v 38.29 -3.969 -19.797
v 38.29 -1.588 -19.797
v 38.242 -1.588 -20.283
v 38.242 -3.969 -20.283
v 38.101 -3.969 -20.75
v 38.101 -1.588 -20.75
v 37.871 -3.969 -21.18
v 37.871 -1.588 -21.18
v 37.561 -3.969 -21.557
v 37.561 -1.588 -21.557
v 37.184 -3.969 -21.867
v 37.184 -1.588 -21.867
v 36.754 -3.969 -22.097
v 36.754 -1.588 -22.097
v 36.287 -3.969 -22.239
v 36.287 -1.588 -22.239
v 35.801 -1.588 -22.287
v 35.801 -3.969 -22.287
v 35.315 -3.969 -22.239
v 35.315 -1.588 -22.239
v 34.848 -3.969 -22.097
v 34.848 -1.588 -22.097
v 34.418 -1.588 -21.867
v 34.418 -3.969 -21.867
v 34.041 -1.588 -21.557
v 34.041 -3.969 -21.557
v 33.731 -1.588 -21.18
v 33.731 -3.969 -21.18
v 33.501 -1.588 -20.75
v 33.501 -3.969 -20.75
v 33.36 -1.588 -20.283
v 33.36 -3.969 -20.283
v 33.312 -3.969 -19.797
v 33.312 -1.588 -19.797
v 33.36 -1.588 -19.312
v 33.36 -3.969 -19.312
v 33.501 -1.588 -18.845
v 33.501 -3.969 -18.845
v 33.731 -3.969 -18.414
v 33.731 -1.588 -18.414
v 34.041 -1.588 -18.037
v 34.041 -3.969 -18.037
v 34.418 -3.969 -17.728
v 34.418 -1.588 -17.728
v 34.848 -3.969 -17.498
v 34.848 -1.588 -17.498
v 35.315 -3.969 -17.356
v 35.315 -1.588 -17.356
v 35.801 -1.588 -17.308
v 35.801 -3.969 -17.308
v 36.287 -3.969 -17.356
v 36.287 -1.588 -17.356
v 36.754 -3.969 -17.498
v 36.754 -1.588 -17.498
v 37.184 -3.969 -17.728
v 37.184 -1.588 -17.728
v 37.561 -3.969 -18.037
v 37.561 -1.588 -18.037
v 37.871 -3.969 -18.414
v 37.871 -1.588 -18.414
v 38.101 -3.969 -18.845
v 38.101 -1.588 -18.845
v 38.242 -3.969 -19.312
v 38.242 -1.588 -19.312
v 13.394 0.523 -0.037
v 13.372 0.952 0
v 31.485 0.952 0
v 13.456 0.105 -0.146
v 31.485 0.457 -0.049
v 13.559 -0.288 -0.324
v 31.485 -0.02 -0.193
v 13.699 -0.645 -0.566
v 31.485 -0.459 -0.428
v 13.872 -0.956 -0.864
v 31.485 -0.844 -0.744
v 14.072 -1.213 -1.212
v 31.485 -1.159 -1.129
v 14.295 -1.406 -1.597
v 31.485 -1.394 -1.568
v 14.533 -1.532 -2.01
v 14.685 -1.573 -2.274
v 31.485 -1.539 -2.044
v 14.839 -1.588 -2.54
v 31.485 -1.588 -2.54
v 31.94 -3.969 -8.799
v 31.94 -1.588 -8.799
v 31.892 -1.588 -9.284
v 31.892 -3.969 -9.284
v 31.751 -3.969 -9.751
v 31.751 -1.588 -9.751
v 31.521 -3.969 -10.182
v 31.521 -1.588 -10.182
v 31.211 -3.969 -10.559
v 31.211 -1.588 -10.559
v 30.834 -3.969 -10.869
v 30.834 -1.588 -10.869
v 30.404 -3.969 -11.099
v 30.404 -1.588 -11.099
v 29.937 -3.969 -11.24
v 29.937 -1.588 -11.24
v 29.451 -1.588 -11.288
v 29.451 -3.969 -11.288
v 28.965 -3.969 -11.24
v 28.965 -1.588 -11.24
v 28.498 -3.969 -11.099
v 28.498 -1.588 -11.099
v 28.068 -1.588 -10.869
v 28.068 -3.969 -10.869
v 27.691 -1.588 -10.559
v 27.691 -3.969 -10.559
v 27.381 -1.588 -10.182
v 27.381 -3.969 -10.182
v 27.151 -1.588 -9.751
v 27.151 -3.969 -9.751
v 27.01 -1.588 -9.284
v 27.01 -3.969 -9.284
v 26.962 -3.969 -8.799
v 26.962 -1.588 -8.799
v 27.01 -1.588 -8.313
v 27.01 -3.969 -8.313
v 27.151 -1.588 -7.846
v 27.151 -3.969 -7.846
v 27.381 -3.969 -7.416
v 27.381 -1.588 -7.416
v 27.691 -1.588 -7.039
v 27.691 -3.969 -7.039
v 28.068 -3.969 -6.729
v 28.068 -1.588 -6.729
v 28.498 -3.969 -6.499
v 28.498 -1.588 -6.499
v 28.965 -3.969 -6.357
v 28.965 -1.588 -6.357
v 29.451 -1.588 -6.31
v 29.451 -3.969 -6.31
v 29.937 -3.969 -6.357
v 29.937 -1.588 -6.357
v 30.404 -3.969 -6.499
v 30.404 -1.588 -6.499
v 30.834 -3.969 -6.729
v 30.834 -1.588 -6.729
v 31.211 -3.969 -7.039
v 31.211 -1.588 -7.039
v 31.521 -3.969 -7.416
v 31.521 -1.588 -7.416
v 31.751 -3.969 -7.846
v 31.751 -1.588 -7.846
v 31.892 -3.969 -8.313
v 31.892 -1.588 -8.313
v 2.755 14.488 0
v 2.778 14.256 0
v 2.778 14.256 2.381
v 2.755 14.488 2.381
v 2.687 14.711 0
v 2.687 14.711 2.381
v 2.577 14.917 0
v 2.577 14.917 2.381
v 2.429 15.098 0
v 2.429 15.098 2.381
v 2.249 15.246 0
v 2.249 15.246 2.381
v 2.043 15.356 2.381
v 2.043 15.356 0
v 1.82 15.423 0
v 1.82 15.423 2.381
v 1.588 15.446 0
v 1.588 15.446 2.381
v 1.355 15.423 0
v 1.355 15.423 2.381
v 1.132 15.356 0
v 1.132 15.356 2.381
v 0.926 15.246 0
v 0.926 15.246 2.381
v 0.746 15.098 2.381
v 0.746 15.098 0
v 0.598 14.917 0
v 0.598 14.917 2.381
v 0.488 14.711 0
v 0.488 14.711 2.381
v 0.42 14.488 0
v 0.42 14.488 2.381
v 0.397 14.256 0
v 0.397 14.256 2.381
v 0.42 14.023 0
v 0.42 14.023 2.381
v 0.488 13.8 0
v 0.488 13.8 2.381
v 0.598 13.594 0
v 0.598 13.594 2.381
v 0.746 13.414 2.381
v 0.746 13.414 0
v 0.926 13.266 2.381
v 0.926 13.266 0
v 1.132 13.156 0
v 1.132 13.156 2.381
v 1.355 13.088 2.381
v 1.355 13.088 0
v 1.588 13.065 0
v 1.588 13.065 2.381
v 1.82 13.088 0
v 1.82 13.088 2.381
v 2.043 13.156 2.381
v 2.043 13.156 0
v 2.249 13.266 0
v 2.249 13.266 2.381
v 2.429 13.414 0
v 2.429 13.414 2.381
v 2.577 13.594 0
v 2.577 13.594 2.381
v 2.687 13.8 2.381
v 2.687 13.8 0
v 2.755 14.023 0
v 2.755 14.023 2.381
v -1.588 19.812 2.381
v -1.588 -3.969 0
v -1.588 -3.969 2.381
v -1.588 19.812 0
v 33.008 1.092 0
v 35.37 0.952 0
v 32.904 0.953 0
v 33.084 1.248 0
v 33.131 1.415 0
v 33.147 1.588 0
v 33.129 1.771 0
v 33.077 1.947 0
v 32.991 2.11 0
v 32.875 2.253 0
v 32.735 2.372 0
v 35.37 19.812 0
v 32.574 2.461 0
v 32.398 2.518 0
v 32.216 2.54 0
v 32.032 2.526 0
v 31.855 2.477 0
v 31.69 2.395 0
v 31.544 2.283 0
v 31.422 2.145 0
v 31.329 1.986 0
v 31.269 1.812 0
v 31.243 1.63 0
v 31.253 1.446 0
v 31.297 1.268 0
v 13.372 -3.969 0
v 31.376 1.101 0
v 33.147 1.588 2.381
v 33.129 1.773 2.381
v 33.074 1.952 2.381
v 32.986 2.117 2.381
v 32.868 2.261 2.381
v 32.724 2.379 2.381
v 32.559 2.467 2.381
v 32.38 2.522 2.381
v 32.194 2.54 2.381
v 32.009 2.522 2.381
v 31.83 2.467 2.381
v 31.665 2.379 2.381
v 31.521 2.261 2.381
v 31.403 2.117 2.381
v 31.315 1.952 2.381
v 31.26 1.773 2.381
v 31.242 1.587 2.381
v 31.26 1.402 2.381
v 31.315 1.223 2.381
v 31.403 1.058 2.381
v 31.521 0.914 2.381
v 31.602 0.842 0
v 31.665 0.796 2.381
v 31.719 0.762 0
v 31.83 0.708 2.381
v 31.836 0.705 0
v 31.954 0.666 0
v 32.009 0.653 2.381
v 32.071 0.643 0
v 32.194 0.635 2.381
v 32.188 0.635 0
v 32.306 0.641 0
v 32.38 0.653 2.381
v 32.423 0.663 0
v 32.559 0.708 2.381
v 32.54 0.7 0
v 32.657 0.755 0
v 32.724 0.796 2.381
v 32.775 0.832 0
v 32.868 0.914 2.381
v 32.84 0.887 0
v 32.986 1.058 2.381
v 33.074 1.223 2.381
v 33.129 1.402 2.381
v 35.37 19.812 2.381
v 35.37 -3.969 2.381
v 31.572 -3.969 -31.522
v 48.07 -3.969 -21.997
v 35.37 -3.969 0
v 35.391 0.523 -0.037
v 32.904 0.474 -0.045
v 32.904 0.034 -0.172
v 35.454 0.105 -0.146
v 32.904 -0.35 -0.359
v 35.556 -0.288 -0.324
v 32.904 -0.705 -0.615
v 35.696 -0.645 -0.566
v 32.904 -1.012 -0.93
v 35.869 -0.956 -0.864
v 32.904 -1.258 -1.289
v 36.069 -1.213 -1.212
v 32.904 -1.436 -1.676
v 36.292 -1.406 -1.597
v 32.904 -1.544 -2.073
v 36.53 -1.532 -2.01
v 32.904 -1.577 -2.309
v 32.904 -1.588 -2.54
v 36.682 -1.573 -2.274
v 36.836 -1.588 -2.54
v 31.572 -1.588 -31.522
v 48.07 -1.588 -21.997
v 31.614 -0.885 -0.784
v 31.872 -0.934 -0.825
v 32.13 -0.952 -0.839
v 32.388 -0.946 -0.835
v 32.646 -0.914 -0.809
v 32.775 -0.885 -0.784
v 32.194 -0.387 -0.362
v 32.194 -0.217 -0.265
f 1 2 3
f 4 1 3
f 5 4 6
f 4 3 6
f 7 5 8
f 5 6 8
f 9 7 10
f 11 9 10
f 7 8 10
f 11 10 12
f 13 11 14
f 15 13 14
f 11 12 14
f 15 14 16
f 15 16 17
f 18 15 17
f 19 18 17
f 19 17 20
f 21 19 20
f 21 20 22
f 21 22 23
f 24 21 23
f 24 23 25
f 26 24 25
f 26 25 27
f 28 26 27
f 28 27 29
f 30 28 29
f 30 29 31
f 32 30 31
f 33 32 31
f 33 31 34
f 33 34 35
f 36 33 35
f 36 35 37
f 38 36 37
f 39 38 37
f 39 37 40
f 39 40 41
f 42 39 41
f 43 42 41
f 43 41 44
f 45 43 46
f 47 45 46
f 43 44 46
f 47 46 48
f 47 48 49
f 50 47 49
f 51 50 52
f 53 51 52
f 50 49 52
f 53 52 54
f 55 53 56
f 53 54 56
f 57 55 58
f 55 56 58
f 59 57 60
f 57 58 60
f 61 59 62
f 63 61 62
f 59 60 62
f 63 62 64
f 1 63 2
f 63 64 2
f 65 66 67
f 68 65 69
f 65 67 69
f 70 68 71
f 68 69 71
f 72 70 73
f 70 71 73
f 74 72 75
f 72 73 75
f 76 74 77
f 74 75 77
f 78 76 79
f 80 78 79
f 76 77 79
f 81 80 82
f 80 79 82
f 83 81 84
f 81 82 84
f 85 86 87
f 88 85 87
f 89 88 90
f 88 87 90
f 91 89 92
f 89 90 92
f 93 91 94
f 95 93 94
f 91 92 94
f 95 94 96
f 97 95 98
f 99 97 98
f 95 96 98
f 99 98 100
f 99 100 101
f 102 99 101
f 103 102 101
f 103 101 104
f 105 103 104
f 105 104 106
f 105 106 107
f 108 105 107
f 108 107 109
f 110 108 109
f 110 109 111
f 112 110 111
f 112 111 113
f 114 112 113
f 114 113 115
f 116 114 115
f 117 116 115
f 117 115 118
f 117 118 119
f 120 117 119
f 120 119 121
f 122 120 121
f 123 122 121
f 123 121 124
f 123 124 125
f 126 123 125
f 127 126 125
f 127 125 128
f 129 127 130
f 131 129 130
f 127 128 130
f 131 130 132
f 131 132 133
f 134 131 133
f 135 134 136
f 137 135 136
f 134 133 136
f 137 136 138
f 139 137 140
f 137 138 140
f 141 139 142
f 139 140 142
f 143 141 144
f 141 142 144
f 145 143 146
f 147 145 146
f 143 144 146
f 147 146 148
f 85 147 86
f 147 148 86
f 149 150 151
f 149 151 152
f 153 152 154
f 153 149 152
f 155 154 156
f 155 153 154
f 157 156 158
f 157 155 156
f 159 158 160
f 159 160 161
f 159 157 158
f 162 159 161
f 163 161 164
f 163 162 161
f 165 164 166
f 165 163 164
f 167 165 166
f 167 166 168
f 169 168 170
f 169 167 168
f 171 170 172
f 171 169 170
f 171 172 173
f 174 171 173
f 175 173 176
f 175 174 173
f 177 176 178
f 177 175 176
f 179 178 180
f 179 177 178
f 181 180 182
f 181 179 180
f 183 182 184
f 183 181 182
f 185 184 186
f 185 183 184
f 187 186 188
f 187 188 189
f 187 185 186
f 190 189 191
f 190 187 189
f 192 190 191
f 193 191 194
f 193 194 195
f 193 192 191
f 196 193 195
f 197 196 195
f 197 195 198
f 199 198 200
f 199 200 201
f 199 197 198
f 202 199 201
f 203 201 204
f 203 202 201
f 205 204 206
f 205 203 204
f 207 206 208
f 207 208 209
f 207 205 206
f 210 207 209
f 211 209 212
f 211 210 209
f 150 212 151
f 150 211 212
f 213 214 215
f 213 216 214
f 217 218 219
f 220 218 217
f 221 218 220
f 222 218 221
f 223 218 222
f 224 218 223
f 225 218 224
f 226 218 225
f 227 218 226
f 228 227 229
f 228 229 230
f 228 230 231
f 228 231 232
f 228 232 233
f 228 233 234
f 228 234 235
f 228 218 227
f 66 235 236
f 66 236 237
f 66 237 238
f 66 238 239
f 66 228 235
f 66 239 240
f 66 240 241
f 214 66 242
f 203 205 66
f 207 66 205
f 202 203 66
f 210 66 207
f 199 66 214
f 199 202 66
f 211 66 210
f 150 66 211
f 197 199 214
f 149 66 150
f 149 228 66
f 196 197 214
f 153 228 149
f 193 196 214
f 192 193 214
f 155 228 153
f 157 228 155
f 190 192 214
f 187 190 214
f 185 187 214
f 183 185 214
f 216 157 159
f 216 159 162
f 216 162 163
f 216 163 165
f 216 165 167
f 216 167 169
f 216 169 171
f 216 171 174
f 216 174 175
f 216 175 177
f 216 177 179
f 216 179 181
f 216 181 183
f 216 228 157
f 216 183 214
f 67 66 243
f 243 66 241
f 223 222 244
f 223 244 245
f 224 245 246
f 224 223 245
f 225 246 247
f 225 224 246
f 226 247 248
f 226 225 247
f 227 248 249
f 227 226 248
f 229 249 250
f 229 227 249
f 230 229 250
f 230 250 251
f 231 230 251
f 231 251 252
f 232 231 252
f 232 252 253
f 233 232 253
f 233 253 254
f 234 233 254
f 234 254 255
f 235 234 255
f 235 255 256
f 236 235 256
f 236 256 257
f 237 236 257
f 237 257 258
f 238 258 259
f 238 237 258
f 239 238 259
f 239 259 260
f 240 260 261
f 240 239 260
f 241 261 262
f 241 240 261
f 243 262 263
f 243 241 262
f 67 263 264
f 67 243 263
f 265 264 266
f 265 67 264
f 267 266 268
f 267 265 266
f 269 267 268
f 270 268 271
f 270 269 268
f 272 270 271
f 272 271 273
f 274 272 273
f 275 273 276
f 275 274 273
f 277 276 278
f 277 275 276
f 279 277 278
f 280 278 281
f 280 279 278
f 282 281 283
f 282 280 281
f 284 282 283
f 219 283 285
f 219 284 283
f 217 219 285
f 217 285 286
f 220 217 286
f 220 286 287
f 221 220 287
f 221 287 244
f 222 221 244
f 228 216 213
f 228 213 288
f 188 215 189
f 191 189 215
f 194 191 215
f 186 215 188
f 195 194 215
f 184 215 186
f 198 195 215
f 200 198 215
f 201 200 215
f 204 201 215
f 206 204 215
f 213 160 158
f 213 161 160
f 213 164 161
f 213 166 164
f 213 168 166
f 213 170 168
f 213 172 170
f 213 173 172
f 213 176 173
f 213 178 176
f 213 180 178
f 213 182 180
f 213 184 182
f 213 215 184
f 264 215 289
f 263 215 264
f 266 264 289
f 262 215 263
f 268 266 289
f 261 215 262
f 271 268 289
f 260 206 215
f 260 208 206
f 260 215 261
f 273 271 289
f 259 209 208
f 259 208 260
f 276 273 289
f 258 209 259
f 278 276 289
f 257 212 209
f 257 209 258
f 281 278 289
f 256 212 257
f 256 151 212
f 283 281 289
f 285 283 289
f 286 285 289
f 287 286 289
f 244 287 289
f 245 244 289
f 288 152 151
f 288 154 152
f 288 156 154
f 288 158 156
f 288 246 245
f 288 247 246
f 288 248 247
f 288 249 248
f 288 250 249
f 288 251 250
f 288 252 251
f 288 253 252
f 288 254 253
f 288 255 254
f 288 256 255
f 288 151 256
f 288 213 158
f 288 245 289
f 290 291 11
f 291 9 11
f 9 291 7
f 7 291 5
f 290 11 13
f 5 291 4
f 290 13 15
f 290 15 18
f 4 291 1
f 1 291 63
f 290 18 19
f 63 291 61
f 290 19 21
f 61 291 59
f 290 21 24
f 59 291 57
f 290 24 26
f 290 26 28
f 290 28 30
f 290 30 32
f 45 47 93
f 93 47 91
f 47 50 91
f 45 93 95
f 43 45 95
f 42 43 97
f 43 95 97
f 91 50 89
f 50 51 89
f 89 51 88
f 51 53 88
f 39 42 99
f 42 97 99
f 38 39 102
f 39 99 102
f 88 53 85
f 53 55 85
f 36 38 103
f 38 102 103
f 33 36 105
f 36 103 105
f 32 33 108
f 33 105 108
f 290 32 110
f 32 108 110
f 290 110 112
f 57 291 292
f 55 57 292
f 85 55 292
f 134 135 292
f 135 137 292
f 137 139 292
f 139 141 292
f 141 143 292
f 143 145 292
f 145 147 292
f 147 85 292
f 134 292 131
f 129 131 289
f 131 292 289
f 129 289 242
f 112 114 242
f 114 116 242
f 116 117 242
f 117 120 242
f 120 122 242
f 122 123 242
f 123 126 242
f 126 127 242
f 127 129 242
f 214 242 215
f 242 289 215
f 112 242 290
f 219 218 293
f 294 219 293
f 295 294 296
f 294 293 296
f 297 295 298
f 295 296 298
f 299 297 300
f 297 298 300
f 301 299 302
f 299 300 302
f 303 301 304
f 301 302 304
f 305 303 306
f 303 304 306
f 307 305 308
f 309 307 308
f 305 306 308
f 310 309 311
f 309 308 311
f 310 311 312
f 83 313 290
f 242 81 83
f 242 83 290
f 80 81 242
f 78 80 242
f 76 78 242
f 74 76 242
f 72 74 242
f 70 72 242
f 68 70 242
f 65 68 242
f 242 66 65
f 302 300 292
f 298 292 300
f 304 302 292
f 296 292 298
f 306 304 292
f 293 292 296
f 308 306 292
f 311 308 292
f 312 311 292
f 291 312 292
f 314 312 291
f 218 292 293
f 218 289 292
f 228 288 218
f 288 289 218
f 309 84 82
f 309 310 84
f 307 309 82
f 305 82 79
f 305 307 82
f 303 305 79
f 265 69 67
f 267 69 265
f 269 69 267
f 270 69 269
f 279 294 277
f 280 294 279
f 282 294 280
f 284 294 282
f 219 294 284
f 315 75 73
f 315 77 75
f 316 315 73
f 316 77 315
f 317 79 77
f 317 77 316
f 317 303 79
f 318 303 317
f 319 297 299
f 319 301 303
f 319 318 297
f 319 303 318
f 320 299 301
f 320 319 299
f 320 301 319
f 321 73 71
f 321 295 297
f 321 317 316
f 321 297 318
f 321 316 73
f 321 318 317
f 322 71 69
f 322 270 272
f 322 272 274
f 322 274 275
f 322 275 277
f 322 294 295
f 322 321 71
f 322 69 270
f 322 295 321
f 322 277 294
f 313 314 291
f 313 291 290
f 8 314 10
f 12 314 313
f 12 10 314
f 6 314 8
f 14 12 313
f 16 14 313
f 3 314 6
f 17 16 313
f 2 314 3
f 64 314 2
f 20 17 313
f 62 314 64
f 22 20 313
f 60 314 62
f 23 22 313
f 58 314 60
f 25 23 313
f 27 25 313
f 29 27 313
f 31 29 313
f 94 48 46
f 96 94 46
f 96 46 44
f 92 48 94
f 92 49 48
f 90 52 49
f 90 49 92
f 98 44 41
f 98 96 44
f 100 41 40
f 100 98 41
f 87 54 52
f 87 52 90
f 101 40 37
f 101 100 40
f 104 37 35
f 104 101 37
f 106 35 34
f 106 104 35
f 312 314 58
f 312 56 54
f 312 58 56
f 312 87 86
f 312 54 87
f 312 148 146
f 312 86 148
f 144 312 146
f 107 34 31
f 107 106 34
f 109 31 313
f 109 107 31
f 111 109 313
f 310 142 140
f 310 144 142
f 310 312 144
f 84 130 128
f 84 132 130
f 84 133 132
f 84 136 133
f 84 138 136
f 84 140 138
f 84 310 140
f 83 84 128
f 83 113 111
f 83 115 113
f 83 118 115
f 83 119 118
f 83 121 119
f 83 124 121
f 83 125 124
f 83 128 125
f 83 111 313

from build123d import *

# Parameters (mm, degrees)
SKETCH1_W           = 36.957
SKETCH1_H           = 21.3995
SKETCH1_R           = 1.190625
SKETCH1_R_2         = 0.9525
BOSS_EXTRUDE1_DEPTH = 2.38125
BOSS_EXTRUDE3_DEPTH = 2.38125
CUT_EXTRUDE2_REACH  = 4.381
SKETCH4_R           = 2.4892
FILLET1_R           = 2.54


with BuildPart() as part:
    # Sketch1 → Boss-Extrude1 (new body)
    with BuildSketch(Plane.XY):
        with Locations((16.891, 9.11225)):
            Rectangle(SKETCH1_W, SKETCH1_H)
        with Locations((1.5875, 14.25575)):
            Circle(SKETCH1_R, mode=Mode.SUBTRACT)
        with Locations((32.1945, 1.5875)):
            Circle(SKETCH1_R_2, mode=Mode.SUBTRACT)
    extrude(amount=BOSS_EXTRUDE1_DEPTH)

    # Sketch2 → Boss-Extrude3 (add)
    with BuildSketch(Plane.XZ.offset(1.5875)):
        Polygon((-1.5875, 2.38125), (35.3695, 2.38125), (35.3695, 0), (48.0695, -21.997045256), (31.571716058, -31.522045256), (13.372454744, 0), (-1.5875, 0), align=None)
    extrude(amount=BOSS_EXTRUDE3_DEPTH)

    # Sketch4 → Cut-Extrude2 (cut, up to next)
    with BuildSketch(Plane(origin=(0, -1.5875, 0), x_dir=(1, 0, 0), z_dir=(0, 1, 0)), mode=Mode.PRIVATE) as cut_extrude2_sk1:
        with Locations((35.800977372, 19.797340731)):
            Circle(SKETCH4_R)
    cut_extrude2_tool1 = extrude(cut_extrude2_sk1.sketch, amount=-CUT_EXTRUDE2_REACH, mode=Mode.PRIVATE) & part.part
    add(cut_extrude2_tool1.solids().sort_by_distance((35.800977, -1.5875, -19.797341))[0], mode=Mode.SUBTRACT)
    # Sketch4 → Cut-Extrude2 (cut, up to next)
    with BuildSketch(Plane(origin=(0, -1.5875, 0), x_dir=(1, 0, 0), z_dir=(0, 1, 0)), mode=Mode.PRIVATE) as cut_extrude2_sk2:
        with Locations((29.450977372, 8.798818102)):
            Circle(SKETCH4_R)
    cut_extrude2_tool2 = extrude(cut_extrude2_sk2.sketch, amount=-CUT_EXTRUDE2_REACH, mode=Mode.PRIVATE) & part.part
    add(cut_extrude2_tool2.solids().sort_by_distance((29.450977, -1.5875, -8.798818))[0], mode=Mode.SUBTRACT)

    # Fillet1
    fillet1_edges = [part.edges().sort_by_distance(p)[0] for p in [
        (24.370977372, -1.5875, 0),
    ]]
    fillet(fillet1_edges, radius=FILLET1_R)


solid = part.part
